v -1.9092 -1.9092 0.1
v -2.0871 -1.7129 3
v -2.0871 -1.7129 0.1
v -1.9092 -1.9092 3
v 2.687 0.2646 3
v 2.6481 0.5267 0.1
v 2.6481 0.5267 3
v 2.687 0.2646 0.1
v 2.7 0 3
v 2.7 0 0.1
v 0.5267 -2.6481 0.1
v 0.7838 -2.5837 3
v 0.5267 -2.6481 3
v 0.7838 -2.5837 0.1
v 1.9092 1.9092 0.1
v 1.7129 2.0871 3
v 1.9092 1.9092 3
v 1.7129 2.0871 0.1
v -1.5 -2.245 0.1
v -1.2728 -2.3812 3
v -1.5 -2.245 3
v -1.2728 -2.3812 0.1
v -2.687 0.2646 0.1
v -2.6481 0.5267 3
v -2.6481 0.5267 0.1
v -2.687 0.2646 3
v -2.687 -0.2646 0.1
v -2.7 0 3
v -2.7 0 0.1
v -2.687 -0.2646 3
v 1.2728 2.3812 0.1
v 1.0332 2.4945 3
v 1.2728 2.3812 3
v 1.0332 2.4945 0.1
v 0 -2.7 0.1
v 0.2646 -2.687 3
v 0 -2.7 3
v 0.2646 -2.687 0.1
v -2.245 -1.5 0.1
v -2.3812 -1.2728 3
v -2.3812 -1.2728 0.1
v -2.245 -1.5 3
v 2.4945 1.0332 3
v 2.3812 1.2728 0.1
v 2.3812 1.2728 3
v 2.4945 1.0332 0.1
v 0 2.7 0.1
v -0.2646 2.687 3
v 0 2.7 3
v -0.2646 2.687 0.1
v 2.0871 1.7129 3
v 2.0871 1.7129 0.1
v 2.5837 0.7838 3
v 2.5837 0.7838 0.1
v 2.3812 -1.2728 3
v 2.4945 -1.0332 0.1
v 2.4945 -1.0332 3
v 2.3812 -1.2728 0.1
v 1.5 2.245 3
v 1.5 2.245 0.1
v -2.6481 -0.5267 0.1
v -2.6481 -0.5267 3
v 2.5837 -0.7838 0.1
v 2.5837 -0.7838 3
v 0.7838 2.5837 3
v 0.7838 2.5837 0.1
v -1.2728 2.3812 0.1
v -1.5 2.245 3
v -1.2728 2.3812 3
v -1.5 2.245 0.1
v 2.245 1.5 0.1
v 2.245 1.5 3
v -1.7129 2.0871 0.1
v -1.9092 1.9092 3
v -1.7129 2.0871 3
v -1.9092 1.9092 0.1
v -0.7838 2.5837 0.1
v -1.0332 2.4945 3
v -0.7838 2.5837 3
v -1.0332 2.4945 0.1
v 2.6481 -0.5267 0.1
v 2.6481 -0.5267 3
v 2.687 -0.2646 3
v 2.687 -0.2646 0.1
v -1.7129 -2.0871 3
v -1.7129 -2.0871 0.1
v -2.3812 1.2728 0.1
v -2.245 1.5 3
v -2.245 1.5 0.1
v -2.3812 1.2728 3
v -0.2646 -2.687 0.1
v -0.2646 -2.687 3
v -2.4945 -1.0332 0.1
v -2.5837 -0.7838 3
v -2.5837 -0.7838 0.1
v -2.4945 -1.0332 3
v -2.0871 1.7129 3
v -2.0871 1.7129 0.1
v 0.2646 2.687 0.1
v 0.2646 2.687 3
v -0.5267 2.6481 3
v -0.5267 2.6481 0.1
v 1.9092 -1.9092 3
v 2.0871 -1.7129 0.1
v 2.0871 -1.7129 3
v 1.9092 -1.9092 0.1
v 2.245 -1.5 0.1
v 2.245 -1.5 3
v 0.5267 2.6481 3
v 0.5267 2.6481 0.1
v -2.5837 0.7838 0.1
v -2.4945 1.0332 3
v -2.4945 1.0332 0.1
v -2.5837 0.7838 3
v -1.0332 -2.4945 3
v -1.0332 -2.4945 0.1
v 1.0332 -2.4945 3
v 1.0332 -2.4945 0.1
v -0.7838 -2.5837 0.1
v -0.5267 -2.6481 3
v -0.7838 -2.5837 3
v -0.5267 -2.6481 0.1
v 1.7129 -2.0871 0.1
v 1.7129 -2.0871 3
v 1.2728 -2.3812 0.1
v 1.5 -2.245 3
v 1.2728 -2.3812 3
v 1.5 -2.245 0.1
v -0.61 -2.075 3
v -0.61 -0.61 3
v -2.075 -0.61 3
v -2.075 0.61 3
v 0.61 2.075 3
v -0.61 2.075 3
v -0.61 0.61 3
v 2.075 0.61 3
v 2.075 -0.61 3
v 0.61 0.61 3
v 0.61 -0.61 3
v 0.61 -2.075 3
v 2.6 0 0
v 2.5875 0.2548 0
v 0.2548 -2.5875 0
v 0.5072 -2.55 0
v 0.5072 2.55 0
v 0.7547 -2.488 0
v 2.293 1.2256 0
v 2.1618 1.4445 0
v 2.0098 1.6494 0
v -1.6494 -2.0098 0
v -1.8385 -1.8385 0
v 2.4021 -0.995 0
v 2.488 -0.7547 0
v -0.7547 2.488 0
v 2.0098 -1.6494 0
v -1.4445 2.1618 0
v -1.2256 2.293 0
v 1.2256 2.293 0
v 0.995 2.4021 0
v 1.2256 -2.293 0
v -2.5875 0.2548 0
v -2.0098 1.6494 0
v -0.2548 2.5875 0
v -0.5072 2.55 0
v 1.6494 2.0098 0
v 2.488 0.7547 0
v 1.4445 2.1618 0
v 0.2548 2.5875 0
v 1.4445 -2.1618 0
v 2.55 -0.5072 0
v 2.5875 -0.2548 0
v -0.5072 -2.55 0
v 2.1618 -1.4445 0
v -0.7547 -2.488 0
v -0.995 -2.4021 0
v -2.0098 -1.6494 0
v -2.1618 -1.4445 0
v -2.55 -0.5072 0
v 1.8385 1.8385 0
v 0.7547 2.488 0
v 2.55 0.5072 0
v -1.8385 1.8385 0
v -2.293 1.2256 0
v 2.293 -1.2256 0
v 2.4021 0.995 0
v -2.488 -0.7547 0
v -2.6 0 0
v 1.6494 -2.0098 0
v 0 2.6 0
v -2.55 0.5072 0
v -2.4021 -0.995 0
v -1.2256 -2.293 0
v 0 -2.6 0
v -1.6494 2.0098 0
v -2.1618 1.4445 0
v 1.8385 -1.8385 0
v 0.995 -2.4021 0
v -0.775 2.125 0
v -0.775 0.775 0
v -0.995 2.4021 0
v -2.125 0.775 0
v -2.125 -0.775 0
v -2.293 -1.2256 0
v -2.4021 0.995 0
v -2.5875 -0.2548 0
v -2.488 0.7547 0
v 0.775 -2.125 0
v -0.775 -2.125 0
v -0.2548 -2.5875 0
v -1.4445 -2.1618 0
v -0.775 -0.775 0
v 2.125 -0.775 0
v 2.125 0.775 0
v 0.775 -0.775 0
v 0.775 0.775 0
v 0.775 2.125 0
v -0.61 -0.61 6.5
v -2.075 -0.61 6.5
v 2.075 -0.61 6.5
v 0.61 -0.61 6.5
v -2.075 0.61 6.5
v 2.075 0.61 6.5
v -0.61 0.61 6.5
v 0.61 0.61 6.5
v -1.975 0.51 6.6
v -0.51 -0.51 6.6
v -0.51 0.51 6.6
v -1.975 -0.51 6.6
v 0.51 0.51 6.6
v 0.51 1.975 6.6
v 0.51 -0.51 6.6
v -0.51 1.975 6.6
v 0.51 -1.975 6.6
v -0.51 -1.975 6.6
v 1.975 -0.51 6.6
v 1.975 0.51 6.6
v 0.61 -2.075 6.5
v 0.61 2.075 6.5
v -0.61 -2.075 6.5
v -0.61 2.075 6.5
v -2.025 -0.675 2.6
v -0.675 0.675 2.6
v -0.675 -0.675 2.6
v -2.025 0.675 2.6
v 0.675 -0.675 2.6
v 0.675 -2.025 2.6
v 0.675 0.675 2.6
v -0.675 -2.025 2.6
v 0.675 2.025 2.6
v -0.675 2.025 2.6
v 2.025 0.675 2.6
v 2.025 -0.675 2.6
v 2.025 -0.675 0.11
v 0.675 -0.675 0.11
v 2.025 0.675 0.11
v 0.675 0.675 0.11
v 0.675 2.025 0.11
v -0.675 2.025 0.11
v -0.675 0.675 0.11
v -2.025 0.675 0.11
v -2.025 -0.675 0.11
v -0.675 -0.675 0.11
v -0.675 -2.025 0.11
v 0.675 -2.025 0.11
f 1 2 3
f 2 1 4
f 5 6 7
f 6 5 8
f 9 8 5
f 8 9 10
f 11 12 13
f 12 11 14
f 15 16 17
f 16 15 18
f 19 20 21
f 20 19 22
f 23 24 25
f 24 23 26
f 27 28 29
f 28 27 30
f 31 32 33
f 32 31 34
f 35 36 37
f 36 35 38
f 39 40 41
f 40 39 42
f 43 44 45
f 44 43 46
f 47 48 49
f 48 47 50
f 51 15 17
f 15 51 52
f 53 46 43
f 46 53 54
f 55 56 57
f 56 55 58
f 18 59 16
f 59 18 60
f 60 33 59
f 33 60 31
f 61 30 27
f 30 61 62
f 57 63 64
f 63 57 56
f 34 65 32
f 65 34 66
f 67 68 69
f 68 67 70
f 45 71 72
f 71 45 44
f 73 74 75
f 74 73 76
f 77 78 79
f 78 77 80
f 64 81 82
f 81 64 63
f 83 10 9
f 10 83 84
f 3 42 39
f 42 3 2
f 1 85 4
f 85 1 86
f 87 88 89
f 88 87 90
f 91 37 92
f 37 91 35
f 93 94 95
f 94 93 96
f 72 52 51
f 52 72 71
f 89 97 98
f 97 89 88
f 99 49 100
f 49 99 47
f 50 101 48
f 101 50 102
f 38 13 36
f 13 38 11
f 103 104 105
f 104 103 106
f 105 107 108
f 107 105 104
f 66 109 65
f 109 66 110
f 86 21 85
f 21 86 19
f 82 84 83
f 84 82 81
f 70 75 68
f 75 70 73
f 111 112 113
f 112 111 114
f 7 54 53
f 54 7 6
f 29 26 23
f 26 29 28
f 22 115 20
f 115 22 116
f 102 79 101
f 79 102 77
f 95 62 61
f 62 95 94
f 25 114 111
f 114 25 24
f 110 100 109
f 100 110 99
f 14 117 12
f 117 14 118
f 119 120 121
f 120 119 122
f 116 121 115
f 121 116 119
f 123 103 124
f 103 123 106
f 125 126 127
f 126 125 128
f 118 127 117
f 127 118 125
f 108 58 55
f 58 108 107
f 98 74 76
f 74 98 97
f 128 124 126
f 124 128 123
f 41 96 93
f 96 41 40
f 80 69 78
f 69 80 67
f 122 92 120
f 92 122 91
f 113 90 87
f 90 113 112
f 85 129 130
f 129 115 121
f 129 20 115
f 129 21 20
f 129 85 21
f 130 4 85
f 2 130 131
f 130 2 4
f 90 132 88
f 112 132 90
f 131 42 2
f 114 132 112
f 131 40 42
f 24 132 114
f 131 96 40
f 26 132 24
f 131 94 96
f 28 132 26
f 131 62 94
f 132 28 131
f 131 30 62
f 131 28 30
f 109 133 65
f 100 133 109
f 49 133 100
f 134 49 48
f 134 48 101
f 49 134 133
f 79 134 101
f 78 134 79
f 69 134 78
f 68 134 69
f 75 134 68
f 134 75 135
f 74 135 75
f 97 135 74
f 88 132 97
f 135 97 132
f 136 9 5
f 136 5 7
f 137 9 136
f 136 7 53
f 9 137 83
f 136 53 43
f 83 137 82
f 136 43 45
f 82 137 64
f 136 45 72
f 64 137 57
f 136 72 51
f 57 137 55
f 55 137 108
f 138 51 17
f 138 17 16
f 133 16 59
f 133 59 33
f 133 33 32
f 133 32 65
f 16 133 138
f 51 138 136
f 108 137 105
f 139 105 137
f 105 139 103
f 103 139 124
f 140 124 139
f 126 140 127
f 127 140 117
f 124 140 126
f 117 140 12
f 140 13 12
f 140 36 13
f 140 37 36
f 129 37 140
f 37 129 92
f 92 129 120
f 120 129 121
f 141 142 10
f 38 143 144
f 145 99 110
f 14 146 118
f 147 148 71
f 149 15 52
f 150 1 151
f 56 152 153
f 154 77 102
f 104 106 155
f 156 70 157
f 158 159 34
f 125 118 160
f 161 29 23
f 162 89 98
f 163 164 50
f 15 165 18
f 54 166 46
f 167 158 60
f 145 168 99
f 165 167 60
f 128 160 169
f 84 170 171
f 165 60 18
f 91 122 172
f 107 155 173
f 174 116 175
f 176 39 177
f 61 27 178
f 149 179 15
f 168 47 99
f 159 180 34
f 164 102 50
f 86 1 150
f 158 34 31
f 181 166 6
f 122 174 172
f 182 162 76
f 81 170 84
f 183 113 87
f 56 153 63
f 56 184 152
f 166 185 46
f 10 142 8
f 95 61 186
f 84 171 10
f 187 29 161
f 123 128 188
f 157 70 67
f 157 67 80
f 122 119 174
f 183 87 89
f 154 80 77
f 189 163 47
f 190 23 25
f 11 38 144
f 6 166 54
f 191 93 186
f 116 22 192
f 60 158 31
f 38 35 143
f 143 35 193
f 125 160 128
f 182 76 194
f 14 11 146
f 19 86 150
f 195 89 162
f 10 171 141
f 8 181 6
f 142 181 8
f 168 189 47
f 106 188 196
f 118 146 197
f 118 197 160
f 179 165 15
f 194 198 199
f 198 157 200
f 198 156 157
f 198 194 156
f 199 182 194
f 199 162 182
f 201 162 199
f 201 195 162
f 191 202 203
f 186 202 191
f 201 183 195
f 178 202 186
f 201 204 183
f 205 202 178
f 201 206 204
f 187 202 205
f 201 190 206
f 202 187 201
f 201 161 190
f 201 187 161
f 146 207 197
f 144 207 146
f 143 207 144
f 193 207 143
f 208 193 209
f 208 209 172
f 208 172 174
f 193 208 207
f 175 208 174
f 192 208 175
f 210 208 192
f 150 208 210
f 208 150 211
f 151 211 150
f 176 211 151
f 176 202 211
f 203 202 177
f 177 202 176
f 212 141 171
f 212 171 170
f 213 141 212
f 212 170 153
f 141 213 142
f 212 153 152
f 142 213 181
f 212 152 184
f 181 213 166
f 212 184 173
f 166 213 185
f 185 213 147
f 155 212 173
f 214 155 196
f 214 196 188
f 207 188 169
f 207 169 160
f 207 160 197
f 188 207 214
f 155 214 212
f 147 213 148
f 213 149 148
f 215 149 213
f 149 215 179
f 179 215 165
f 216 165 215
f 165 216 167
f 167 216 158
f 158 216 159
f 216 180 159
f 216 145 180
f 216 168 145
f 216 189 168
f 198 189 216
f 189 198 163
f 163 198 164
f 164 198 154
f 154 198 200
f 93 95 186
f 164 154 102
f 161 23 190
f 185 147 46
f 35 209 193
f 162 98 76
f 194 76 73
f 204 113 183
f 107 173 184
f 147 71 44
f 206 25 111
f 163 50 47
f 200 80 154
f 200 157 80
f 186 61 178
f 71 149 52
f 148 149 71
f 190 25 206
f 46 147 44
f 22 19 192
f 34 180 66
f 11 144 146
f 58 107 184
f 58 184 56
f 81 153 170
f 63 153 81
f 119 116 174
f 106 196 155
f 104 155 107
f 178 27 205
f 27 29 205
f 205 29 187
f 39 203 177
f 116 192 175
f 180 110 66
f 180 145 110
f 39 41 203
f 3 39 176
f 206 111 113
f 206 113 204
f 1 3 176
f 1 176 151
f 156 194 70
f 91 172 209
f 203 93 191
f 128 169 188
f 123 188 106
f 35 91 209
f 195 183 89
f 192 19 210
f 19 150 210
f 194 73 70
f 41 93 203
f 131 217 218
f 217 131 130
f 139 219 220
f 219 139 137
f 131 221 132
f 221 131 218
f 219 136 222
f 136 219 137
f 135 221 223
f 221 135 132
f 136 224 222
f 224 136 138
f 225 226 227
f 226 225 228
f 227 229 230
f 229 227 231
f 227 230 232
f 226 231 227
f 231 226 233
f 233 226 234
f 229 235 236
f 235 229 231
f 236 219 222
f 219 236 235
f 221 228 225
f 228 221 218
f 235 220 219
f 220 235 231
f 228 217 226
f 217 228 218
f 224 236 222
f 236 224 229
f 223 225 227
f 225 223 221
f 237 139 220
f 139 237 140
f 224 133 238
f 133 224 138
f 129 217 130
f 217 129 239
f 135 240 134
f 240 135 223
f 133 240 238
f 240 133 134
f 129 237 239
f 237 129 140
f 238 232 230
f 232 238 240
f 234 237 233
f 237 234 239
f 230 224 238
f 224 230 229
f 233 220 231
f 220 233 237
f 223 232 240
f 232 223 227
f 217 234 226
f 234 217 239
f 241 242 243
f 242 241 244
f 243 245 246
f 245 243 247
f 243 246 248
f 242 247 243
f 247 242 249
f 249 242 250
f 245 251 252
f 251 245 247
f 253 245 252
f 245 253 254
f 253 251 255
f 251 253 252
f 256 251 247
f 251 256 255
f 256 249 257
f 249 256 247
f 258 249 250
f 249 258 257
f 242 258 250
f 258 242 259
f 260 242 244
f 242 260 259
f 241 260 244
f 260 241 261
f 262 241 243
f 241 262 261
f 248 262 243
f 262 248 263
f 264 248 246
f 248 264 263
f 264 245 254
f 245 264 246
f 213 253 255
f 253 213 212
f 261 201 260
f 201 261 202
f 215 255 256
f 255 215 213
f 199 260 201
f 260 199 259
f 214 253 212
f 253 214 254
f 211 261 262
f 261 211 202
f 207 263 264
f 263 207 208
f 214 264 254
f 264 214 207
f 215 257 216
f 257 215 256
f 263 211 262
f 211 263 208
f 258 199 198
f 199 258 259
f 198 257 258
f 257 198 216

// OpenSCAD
// Choc v2 keycap riser -- a straight round post that plugs into a Kailh Choc
// v2 (PG1353) stem and carries a plain MX cross on top, so any MX or Choc v2
// keycap stands higher, optionally leaned over by `tilt` degrees toward the
// compass direction `azimuth`.
//
// The post is no wider than what it plugs into, so nothing overhangs: it
// prints socket down, straight up, with no supports, and never meets the
// switch housing at bottom-out. A tilted top only leans the stem, which
// prints fine up to the usual 45 degrees.
//
// As with the tilter, the cross only engages every 90 degrees: azimuth=0
// covers the four square leans, azimuth=45 the four diagonal ones.
//
// Select with -D tilt=25 -D azimuth=45.

height  = 0.5;        // post above the seat, at its lowest edge -- 0.5 is
                      // the printed-and-confirmed straight riser
tilt    = 0;          // degrees of lean; 0 leaves a straight riser
azimuth = 0;          // which way it leans, degrees CCW from +x
collar  = false;      // true: post widens to the ø6.50 rim and seats on it;
                      // false: post as thin as the boss, seats on the cross top

// ---------------------------------------------------------------------------
// Male stem -- the tilter's MX cross, thickened a touch for a snugger cap.
// ---------------------------------------------------------------------------
cap_cross_l = 4.10;   // arm length
cap_cross_w = 1.17;   // arm width
cap_fit     = 0.05;   // added to both: printed caps were a touch loose
stem_h      = 3.60;   // male stem, standing off the post top
lead_in     = 0.10;   // chamfer on the socket mouth and on the stem tip

// ---------------------------------------------------------------------------
// Switch side -- same socket as choc_v2_tilter.scad; see the datasheet notes
// there. The boss drops into the annular slot of the v2 stem tube and the
// post (with a collar) lands on the ø6.50 tube rim.
// ---------------------------------------------------------------------------
stem_bore  = 5.50;    // bore the boss drops into
stem_od    = 6.50;    // tube outside diameter -- the post diameter with a collar
cross_l    = 4.00;    // cross arm span      (datasheet 2-4.00 +/-0.05)
cross_w    = 1.30;    // cross arm width     (datasheet 2-1.30 +/-0.03)

boss_h     = 2.50;    // how far the boss reaches into the slot (3.52 available)
boss_fit   = 0.10;    // boss diameter under the bore
socket_fit = 0.05;    // added to both cross dimensions of the hole -- printed
                      // and confirmed a firm fit; the tilter's 0.15 was loose
cross_over = 0.10;    // hole past the shoulder, so the rim seats before the cross
web        = 0.40;    // roof over the cross hole: two 0.2 layers

$fn = 64;
eps = 0.01;
big = 100;

// ---------------------------------------------------------------------------
// Derived
// ---------------------------------------------------------------------------
boss_d   = stem_bore - boss_fit;
hole_l   = cross_l + socket_fit;
hole_w   = cross_w + socket_fit;
hole_top = boss_h + cross_over;
stem_l   = cap_cross_l + cap_fit;
stem_w   = cap_cross_w + cap_fit;
post_d   = collar ? stem_od : boss_d;

// The tilted top drops fastest at the post edge, so `height` is taken there
// and the centre rises with the tilt. Keep `web` over the hole.
top_z = height + post_d / 2 * tan(tilt);
assert(height >= cross_over + web, "post too short to roof the cross hole");

// ---------------------------------------------------------------------------
// Parts
// ---------------------------------------------------------------------------
module cross_2d(l, w) {
    square([l, w], center = true);
    square([w, l], center = true);
}

module bar_mouth(l, w) {
    hull() {
        translate([0, 0, -eps]) linear_extrude(eps)
            square([l + 2 * lead_in, w + 2 * lead_in], center = true);
        translate([0, 0, lead_in]) linear_extrude(eps) square([l, w], center = true);
    }
}

module bar_tip(l, w) {
    hull() {
        linear_extrude(stem_h - lead_in) square([l, w], center = true);
        translate([0, 0, stem_h - eps]) linear_extrude(eps)
            square([l - 2 * lead_in, w - 2 * lead_in], center = true);
    }
}

// Tip +z over toward `azimuth`, by turning about the horizontal axis square to
// it. The socket below stays put -- it has to stay square to the switch.
module lean() {
    rotate(a = tilt, v = [-sin(azimuth), cos(azimuth), 0]) children();
}

// Boss that drops into the annular slot, then the post standing on the rim,
// cut off by the (possibly tilted) top.
module body() {
    cylinder(d1 = boss_d - 2 * lead_in, d2 = boss_d, h = lead_in);
    translate([0, 0, lead_in]) cylinder(d = boss_d, h = boss_h - lead_in + eps);
    intersection() {
        translate([0, 0, boss_h]) cylinder(d = post_d, h = big);
        translate([0, 0, boss_h + top_z]) lean()
            translate([0, 0, -big / 2]) cube(big, center = true);
    }
}

module cross_hole() {
    translate([0, 0, -eps]) linear_extrude(hole_top + eps) cross_2d(hole_l, hole_w);
    bar_mouth(hole_l, hole_w);
    rotate([0, 0, 90]) bar_mouth(hole_l, hole_w);
}

// Sunk below the face by the drop under its arms, so a tilted stem has no
// gap at its low side.
module stem() {
    sink = stem_l / 2 * tan(tilt) + eps;
    bar_tip(stem_l, stem_w);
    rotate([0, 0, 90]) bar_tip(stem_l, stem_w);
    translate([0, 0, -sink]) linear_extrude(sink + eps) cross_2d(stem_l, stem_w);
}

// ---------------------------------------------------------------------------
// Assembly -- socket mouth down on the bed.
// ---------------------------------------------------------------------------
difference() {
    union() {
        body();
        translate([0, 0, boss_h + top_z]) lean() stem();
    }
    cross_hole();
}
